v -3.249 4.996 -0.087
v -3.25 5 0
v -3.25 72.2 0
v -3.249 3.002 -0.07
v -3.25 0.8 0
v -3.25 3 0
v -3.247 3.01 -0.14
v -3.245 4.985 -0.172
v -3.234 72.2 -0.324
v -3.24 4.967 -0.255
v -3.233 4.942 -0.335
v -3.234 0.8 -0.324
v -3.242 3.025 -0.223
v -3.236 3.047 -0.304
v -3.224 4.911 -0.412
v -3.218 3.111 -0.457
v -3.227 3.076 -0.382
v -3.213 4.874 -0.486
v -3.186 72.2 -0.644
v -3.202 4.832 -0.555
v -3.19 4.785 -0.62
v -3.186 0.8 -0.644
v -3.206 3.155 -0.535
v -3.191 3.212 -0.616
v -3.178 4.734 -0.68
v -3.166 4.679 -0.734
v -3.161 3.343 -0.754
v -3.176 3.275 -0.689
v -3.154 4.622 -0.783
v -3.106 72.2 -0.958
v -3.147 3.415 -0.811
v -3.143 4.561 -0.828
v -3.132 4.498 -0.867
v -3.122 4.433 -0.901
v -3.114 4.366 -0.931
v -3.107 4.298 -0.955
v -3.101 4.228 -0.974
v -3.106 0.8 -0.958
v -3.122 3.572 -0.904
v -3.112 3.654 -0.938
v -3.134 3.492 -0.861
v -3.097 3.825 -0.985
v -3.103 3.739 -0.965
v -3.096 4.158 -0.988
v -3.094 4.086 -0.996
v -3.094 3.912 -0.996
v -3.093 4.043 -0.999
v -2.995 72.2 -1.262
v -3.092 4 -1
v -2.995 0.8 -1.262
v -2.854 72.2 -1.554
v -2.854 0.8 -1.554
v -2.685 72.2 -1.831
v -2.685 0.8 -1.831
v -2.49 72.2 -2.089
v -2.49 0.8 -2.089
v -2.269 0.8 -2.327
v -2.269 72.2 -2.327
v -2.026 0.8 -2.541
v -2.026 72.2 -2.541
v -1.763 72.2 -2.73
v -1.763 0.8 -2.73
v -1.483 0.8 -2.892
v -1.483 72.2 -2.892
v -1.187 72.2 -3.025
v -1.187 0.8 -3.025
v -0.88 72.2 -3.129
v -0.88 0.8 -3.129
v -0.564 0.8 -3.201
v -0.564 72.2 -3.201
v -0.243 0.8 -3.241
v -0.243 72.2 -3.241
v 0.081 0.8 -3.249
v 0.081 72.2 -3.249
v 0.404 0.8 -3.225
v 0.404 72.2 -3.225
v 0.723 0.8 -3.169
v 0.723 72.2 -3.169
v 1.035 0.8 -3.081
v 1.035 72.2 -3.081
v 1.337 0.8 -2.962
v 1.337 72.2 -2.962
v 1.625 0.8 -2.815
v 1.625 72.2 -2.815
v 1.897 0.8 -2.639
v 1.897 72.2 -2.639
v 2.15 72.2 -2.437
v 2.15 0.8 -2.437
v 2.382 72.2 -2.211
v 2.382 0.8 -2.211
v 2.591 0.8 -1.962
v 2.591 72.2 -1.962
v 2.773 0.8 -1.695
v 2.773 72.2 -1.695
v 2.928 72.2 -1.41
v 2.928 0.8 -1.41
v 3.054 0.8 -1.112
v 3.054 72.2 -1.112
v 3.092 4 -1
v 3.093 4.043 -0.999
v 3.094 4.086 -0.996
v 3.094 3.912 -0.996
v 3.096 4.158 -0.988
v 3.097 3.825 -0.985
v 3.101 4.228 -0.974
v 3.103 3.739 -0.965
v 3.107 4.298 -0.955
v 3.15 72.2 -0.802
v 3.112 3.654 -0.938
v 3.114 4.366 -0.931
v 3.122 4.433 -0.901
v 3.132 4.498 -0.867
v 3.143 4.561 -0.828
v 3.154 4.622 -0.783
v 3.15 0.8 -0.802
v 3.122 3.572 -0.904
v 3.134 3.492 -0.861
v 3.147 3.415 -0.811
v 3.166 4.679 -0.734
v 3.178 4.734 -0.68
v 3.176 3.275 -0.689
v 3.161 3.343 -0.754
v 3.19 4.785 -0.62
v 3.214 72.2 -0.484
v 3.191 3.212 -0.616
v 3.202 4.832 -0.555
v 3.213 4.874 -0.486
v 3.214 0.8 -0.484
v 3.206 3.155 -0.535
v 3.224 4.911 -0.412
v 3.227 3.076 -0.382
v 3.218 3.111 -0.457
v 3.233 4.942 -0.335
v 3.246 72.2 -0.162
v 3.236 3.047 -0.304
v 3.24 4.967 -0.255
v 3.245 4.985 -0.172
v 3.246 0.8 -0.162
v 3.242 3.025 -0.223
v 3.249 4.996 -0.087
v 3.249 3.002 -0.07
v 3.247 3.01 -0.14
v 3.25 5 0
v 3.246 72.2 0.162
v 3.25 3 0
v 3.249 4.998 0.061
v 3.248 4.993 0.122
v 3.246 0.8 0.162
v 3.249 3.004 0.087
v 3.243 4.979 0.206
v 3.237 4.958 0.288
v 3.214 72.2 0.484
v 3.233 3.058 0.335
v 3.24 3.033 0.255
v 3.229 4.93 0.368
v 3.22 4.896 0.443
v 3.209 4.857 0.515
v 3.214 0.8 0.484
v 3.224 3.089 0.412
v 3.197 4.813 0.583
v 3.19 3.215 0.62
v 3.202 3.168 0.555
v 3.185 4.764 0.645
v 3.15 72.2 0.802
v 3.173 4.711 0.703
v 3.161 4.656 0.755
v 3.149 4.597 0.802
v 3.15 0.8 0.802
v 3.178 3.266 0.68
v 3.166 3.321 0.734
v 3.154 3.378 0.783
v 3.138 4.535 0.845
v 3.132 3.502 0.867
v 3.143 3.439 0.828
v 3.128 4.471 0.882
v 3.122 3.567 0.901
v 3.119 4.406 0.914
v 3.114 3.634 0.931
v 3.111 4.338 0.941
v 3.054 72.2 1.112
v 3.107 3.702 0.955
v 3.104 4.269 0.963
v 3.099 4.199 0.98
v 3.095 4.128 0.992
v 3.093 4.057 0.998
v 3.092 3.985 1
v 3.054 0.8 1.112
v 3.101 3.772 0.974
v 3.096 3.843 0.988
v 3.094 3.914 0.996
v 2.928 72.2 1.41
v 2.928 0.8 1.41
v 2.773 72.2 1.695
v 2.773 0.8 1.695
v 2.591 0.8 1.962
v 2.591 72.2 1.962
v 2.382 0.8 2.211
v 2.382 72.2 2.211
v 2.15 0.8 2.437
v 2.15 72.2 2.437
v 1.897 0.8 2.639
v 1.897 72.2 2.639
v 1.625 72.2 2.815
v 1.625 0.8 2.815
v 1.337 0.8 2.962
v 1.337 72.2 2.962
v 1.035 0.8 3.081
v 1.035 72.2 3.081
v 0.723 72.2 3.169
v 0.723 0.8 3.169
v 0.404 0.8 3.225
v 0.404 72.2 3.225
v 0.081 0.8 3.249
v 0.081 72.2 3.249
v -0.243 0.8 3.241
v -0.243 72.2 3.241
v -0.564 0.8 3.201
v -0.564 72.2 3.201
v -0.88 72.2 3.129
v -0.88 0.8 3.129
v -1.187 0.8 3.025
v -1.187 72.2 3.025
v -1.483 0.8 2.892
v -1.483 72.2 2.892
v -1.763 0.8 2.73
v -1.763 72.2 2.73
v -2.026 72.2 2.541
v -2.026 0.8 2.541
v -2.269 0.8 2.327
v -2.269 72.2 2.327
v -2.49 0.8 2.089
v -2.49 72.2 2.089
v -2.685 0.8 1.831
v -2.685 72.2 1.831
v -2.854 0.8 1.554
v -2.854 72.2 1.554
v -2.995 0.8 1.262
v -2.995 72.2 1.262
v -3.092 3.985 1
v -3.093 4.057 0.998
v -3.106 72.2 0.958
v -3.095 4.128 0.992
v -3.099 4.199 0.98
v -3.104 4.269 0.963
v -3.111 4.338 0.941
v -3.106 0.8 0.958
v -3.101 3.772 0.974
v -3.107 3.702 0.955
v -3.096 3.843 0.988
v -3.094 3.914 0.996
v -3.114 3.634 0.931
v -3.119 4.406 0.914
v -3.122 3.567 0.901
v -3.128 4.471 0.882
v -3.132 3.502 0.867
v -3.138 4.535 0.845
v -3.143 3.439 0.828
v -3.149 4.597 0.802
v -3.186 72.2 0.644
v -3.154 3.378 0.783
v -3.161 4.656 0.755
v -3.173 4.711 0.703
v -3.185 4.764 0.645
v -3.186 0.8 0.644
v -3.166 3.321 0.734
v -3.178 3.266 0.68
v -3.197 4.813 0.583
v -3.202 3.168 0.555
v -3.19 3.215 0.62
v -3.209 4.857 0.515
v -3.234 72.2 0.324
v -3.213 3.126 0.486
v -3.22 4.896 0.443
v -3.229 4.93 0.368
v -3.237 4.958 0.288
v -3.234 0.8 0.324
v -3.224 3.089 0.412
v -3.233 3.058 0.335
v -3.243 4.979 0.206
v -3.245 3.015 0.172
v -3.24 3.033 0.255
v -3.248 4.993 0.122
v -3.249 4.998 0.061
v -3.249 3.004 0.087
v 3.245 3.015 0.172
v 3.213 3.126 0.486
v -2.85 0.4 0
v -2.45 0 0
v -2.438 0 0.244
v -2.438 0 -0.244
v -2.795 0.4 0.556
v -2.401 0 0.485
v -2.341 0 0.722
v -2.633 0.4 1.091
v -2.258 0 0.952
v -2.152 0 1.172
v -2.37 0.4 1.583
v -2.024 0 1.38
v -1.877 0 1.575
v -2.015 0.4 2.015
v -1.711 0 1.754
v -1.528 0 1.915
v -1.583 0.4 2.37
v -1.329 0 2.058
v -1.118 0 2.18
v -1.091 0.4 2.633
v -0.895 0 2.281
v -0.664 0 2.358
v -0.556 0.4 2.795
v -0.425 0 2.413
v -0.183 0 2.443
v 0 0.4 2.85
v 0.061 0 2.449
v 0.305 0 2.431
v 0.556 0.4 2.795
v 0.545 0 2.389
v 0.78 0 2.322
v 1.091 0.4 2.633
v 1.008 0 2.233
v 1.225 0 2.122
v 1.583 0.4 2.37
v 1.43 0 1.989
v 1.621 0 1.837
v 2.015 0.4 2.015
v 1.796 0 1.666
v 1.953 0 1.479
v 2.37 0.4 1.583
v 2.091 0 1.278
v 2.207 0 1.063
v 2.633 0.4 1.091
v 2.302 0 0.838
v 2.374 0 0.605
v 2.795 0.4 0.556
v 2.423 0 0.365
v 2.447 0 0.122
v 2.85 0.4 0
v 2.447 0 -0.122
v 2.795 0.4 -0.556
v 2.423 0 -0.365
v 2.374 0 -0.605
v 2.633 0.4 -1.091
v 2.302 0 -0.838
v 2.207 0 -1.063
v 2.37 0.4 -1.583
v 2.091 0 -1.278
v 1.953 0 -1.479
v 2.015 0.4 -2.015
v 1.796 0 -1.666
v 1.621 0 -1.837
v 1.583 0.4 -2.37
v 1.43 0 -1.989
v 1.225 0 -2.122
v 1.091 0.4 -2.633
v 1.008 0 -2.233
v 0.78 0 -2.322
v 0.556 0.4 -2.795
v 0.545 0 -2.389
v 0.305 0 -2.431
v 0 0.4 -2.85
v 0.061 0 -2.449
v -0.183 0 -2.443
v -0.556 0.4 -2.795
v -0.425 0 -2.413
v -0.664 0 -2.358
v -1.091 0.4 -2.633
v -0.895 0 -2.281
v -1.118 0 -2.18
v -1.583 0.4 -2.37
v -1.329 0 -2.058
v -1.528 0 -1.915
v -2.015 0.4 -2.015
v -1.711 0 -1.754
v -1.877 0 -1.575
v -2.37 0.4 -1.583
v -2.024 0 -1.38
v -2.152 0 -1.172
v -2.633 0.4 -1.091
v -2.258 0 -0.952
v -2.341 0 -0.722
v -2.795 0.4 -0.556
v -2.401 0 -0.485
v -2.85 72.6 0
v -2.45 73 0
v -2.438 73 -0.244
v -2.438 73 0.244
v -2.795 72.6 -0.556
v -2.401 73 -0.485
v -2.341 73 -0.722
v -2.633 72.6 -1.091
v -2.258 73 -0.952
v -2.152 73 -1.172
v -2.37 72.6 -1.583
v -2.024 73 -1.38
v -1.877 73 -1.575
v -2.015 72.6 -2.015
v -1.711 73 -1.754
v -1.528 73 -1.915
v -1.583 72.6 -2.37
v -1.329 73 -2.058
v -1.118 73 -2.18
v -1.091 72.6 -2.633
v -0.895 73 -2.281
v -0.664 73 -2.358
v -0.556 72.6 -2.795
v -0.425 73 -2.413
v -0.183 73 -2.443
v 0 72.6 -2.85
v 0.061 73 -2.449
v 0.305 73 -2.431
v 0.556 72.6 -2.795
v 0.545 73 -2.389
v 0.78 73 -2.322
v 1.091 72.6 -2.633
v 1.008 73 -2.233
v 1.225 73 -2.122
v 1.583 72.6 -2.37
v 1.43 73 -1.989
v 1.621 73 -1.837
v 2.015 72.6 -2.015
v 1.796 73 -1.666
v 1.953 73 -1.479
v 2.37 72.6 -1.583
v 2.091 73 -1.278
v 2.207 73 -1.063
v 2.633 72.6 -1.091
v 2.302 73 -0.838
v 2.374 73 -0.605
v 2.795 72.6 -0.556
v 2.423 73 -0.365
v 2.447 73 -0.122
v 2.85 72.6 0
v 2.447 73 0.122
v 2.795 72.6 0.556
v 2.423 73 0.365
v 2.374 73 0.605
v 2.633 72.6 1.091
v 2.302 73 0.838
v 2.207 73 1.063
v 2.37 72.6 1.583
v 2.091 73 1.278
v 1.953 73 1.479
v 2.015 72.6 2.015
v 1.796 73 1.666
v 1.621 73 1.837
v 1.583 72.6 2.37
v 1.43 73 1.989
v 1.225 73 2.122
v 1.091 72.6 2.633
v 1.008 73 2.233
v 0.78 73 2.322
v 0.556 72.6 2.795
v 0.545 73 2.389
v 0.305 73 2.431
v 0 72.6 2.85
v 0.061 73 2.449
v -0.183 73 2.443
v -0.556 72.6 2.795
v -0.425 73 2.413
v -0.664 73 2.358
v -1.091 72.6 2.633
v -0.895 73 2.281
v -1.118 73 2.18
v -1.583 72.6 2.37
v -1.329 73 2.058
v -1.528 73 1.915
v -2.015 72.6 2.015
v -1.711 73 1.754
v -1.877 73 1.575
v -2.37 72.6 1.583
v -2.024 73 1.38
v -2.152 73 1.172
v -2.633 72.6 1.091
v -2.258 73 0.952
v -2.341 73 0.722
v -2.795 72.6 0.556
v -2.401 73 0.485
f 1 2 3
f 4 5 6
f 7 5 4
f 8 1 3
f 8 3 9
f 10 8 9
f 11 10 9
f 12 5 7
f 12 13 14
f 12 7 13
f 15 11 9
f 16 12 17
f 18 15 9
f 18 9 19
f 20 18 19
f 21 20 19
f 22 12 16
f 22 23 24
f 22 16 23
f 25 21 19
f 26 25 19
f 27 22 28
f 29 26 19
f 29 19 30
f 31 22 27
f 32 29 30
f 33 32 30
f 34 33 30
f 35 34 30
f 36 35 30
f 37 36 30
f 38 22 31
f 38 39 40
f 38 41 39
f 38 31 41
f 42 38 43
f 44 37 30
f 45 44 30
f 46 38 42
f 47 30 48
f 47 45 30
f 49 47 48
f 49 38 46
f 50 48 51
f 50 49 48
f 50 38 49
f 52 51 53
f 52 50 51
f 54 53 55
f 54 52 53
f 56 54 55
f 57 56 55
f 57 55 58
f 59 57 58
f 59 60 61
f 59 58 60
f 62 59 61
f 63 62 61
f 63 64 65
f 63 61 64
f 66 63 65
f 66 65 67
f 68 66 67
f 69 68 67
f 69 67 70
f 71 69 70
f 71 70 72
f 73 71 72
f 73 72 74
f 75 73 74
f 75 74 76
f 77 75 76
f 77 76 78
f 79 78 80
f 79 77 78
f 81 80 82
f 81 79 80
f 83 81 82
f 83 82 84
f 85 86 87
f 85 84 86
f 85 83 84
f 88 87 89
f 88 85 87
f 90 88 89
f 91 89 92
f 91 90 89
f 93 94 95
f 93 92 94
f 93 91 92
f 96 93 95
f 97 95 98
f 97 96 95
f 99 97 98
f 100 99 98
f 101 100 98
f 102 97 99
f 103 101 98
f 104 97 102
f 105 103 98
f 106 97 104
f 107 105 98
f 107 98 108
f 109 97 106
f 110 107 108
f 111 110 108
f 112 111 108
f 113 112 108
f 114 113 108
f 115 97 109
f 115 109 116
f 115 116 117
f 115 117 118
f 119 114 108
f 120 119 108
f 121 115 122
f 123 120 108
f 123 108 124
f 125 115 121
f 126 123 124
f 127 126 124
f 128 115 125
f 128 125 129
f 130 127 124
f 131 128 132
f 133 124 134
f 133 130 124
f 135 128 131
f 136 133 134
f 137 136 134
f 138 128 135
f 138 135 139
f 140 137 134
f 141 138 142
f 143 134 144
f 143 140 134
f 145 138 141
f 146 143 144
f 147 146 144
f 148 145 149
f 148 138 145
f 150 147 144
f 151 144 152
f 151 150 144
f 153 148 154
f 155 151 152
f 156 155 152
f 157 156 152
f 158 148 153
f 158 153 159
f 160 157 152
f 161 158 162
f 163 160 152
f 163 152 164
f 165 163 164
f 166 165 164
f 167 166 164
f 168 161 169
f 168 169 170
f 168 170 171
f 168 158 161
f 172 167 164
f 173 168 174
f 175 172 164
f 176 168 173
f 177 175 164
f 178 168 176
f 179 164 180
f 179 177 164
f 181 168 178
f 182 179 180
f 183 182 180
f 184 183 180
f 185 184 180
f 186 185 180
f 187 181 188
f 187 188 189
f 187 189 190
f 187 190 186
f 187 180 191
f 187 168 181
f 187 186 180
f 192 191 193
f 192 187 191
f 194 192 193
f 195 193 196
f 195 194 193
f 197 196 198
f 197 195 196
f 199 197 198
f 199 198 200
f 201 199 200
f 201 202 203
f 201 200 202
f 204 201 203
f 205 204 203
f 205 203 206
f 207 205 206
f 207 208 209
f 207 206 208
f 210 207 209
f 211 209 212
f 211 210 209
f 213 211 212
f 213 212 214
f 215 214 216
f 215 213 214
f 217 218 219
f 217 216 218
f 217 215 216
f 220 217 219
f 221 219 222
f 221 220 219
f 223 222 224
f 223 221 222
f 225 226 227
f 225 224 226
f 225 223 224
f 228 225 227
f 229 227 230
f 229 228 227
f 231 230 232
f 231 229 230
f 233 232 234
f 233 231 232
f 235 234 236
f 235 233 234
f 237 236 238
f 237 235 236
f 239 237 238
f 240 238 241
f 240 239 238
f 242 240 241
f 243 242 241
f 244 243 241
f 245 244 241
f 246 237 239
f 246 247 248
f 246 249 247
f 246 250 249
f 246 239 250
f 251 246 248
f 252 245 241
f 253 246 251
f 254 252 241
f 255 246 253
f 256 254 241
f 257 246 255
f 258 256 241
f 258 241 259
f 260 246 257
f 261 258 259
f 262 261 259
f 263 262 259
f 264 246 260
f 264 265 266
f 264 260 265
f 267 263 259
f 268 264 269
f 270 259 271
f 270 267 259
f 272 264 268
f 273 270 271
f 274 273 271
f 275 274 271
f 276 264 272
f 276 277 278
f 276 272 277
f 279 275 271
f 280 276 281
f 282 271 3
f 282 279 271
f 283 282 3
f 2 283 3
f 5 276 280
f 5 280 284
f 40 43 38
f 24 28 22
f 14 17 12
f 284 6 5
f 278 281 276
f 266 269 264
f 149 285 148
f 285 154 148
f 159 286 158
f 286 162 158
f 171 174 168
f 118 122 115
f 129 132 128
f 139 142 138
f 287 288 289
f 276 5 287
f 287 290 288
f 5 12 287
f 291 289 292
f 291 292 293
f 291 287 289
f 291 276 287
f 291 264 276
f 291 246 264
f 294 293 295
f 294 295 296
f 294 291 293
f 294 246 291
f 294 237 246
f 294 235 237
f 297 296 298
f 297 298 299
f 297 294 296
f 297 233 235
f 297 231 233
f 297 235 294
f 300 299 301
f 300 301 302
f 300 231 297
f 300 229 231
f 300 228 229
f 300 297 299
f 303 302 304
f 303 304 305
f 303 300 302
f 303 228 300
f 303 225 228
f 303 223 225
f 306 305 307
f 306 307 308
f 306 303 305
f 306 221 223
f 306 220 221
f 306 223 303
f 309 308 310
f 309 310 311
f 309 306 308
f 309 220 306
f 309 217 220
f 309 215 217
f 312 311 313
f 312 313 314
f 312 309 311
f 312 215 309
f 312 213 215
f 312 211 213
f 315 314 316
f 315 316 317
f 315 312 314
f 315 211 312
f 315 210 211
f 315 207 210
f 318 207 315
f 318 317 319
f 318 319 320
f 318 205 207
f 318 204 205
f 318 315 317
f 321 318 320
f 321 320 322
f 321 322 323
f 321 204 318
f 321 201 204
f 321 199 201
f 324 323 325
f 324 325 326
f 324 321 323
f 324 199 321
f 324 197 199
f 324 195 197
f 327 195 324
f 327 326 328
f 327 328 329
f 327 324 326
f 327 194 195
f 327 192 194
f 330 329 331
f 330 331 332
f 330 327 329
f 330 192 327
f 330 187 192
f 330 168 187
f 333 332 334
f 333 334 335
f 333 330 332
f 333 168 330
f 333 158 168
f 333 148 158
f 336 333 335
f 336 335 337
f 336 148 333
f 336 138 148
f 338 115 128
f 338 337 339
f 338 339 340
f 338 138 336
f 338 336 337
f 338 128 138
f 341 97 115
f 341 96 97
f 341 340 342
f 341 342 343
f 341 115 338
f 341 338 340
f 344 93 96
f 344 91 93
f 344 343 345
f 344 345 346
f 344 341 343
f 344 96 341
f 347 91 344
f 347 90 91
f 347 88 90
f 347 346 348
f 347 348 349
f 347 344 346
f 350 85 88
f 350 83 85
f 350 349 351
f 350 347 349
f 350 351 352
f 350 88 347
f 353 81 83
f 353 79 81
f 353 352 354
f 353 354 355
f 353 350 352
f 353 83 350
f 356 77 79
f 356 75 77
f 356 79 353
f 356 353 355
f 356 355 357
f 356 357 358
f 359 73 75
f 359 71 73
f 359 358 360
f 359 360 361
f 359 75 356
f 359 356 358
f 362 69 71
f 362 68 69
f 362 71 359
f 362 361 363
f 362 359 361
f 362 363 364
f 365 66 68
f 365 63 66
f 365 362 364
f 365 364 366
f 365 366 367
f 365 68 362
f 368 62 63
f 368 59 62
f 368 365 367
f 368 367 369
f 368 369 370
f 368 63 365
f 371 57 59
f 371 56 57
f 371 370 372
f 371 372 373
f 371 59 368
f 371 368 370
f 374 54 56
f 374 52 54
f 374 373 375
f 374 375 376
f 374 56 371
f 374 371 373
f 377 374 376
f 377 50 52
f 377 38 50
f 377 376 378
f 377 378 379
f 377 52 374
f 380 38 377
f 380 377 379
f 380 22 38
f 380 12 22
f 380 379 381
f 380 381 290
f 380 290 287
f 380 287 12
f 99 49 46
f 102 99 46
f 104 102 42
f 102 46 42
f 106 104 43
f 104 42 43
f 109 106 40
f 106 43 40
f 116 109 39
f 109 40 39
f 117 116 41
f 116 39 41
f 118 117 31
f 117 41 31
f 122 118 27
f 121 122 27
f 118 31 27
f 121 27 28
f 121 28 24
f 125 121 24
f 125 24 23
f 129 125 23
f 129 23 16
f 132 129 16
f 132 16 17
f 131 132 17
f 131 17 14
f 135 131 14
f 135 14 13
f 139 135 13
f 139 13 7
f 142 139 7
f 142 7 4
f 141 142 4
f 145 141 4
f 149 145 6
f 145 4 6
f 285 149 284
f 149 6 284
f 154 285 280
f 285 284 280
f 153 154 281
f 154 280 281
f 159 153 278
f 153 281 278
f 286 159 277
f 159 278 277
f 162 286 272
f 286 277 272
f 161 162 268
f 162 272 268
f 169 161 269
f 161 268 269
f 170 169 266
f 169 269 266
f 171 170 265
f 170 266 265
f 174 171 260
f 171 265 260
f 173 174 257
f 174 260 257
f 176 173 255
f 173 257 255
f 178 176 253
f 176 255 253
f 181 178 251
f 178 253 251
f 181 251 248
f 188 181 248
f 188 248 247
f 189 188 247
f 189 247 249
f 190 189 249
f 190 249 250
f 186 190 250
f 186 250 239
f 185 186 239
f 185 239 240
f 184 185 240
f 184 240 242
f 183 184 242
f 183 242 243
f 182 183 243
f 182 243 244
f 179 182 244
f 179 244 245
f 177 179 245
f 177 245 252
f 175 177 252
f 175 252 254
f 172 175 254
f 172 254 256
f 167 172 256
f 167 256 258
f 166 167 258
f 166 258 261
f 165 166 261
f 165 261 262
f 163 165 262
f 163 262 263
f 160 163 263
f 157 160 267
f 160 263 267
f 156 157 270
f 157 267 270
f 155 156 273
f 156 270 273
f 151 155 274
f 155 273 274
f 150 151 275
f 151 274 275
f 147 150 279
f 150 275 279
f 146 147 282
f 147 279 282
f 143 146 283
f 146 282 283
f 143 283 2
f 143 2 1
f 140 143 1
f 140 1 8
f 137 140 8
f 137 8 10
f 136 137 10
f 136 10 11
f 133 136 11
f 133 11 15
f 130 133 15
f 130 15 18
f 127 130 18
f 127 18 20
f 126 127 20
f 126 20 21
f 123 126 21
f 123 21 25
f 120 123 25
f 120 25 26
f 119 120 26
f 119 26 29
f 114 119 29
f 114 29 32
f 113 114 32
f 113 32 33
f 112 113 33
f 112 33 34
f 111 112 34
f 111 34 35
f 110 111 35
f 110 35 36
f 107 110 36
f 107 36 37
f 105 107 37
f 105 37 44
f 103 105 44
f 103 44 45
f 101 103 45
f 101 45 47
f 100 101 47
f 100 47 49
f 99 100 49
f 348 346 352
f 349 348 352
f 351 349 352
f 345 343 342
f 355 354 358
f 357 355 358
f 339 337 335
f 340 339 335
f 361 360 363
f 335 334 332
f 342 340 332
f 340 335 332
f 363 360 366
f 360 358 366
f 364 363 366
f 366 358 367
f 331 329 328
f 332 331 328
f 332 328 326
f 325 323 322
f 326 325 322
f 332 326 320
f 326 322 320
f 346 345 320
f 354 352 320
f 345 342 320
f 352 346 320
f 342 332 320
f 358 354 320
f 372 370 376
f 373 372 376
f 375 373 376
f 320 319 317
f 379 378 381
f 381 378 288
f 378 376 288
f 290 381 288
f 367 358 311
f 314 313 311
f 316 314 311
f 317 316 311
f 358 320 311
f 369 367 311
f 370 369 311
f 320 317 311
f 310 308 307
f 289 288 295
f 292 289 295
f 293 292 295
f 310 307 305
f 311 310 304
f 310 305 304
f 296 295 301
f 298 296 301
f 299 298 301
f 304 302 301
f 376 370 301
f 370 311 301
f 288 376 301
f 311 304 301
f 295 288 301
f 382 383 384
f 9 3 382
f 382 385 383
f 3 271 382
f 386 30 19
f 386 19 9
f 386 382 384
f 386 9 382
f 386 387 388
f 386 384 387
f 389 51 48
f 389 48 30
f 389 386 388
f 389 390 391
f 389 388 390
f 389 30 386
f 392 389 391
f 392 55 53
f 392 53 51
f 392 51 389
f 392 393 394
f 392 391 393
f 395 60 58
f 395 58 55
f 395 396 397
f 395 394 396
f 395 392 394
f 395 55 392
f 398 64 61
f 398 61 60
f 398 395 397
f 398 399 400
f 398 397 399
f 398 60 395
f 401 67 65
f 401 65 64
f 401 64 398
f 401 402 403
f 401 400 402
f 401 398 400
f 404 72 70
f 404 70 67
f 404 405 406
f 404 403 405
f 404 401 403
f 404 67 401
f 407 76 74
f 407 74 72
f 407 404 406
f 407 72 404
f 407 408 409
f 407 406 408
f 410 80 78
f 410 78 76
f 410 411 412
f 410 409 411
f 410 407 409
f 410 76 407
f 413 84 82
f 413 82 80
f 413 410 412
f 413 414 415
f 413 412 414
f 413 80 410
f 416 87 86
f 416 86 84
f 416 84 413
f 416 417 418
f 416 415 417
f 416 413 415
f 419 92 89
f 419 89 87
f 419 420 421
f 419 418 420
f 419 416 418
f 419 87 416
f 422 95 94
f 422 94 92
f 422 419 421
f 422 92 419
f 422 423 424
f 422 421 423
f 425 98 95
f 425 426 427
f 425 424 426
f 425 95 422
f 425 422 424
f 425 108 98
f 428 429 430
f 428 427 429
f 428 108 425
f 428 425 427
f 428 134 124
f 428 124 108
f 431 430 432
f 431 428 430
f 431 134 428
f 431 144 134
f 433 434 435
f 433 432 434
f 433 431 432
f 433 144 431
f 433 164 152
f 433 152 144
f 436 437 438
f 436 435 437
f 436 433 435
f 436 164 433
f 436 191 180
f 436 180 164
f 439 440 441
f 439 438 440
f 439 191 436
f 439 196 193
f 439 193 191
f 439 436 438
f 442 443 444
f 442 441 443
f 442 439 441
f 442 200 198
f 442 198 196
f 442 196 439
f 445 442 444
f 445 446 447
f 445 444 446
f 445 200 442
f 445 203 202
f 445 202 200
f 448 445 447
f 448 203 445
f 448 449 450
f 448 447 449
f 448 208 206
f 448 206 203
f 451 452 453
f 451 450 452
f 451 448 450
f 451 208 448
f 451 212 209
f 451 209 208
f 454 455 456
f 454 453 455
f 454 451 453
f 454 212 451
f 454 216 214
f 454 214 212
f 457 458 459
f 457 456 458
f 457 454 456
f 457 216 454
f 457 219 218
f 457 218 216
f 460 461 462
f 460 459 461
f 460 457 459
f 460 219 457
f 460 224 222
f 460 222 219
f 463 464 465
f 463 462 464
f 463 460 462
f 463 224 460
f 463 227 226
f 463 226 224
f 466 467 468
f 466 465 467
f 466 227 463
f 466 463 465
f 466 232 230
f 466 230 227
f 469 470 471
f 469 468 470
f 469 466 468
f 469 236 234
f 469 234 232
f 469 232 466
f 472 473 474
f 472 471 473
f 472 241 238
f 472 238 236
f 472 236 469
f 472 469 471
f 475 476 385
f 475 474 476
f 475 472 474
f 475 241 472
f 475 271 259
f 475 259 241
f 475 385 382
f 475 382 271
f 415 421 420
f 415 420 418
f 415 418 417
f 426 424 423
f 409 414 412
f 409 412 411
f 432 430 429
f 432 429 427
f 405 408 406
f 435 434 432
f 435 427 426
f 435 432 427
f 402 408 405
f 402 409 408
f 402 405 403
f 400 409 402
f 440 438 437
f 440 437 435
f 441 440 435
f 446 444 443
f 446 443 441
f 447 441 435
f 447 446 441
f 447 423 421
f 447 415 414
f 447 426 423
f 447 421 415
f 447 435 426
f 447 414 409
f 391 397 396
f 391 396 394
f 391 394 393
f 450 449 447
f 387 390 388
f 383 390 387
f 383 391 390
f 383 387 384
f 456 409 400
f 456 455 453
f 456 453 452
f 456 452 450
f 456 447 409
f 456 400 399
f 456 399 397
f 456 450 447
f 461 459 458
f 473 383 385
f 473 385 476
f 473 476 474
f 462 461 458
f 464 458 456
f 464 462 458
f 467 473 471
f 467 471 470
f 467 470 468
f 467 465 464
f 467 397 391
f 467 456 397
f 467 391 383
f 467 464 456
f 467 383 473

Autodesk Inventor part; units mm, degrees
ref_plane "XZ Plane" through (0, 0, 0) normal (0, 1, 0) x (-1, 0, 0)
ref_plane "XY Plane" through (0, 0, 0) normal (0, 0, 1) x (1, 0, 0)
sketch "Skizze1" plane through (0, 0, 0) normal (0, 1, 0) x (-1, 0, 0)
  circle A0 centre (0, 0) radius 3.25
  dimension "d0" = 6.5
extrude "Extrusion1" add sketch "Skizze1" along normal blind 73
chamfer "Fasen1" distance 0.8 angle 45 2 edges at (3.25, 73, 0) (3.25, 0, 0)
ref_plane "Arbeitsebene1" through (3.25, 0, 0) normal (1, 0, 0) x (0, 1, 0)
sketch "Skizze2" plane through (3.25, 0, 0) normal (1, 0, 0) x (0, 1, 0)
  point P0 (0, 0)
  point P1 (4, 0)
  dimension "d7" = 4
hole "Bohrung1" at (3.25, 4, 0) direction (-1, 0, 0) diameter 2 end through all
properties part number "BMS_fiiting_long" material "Edelstahl"
